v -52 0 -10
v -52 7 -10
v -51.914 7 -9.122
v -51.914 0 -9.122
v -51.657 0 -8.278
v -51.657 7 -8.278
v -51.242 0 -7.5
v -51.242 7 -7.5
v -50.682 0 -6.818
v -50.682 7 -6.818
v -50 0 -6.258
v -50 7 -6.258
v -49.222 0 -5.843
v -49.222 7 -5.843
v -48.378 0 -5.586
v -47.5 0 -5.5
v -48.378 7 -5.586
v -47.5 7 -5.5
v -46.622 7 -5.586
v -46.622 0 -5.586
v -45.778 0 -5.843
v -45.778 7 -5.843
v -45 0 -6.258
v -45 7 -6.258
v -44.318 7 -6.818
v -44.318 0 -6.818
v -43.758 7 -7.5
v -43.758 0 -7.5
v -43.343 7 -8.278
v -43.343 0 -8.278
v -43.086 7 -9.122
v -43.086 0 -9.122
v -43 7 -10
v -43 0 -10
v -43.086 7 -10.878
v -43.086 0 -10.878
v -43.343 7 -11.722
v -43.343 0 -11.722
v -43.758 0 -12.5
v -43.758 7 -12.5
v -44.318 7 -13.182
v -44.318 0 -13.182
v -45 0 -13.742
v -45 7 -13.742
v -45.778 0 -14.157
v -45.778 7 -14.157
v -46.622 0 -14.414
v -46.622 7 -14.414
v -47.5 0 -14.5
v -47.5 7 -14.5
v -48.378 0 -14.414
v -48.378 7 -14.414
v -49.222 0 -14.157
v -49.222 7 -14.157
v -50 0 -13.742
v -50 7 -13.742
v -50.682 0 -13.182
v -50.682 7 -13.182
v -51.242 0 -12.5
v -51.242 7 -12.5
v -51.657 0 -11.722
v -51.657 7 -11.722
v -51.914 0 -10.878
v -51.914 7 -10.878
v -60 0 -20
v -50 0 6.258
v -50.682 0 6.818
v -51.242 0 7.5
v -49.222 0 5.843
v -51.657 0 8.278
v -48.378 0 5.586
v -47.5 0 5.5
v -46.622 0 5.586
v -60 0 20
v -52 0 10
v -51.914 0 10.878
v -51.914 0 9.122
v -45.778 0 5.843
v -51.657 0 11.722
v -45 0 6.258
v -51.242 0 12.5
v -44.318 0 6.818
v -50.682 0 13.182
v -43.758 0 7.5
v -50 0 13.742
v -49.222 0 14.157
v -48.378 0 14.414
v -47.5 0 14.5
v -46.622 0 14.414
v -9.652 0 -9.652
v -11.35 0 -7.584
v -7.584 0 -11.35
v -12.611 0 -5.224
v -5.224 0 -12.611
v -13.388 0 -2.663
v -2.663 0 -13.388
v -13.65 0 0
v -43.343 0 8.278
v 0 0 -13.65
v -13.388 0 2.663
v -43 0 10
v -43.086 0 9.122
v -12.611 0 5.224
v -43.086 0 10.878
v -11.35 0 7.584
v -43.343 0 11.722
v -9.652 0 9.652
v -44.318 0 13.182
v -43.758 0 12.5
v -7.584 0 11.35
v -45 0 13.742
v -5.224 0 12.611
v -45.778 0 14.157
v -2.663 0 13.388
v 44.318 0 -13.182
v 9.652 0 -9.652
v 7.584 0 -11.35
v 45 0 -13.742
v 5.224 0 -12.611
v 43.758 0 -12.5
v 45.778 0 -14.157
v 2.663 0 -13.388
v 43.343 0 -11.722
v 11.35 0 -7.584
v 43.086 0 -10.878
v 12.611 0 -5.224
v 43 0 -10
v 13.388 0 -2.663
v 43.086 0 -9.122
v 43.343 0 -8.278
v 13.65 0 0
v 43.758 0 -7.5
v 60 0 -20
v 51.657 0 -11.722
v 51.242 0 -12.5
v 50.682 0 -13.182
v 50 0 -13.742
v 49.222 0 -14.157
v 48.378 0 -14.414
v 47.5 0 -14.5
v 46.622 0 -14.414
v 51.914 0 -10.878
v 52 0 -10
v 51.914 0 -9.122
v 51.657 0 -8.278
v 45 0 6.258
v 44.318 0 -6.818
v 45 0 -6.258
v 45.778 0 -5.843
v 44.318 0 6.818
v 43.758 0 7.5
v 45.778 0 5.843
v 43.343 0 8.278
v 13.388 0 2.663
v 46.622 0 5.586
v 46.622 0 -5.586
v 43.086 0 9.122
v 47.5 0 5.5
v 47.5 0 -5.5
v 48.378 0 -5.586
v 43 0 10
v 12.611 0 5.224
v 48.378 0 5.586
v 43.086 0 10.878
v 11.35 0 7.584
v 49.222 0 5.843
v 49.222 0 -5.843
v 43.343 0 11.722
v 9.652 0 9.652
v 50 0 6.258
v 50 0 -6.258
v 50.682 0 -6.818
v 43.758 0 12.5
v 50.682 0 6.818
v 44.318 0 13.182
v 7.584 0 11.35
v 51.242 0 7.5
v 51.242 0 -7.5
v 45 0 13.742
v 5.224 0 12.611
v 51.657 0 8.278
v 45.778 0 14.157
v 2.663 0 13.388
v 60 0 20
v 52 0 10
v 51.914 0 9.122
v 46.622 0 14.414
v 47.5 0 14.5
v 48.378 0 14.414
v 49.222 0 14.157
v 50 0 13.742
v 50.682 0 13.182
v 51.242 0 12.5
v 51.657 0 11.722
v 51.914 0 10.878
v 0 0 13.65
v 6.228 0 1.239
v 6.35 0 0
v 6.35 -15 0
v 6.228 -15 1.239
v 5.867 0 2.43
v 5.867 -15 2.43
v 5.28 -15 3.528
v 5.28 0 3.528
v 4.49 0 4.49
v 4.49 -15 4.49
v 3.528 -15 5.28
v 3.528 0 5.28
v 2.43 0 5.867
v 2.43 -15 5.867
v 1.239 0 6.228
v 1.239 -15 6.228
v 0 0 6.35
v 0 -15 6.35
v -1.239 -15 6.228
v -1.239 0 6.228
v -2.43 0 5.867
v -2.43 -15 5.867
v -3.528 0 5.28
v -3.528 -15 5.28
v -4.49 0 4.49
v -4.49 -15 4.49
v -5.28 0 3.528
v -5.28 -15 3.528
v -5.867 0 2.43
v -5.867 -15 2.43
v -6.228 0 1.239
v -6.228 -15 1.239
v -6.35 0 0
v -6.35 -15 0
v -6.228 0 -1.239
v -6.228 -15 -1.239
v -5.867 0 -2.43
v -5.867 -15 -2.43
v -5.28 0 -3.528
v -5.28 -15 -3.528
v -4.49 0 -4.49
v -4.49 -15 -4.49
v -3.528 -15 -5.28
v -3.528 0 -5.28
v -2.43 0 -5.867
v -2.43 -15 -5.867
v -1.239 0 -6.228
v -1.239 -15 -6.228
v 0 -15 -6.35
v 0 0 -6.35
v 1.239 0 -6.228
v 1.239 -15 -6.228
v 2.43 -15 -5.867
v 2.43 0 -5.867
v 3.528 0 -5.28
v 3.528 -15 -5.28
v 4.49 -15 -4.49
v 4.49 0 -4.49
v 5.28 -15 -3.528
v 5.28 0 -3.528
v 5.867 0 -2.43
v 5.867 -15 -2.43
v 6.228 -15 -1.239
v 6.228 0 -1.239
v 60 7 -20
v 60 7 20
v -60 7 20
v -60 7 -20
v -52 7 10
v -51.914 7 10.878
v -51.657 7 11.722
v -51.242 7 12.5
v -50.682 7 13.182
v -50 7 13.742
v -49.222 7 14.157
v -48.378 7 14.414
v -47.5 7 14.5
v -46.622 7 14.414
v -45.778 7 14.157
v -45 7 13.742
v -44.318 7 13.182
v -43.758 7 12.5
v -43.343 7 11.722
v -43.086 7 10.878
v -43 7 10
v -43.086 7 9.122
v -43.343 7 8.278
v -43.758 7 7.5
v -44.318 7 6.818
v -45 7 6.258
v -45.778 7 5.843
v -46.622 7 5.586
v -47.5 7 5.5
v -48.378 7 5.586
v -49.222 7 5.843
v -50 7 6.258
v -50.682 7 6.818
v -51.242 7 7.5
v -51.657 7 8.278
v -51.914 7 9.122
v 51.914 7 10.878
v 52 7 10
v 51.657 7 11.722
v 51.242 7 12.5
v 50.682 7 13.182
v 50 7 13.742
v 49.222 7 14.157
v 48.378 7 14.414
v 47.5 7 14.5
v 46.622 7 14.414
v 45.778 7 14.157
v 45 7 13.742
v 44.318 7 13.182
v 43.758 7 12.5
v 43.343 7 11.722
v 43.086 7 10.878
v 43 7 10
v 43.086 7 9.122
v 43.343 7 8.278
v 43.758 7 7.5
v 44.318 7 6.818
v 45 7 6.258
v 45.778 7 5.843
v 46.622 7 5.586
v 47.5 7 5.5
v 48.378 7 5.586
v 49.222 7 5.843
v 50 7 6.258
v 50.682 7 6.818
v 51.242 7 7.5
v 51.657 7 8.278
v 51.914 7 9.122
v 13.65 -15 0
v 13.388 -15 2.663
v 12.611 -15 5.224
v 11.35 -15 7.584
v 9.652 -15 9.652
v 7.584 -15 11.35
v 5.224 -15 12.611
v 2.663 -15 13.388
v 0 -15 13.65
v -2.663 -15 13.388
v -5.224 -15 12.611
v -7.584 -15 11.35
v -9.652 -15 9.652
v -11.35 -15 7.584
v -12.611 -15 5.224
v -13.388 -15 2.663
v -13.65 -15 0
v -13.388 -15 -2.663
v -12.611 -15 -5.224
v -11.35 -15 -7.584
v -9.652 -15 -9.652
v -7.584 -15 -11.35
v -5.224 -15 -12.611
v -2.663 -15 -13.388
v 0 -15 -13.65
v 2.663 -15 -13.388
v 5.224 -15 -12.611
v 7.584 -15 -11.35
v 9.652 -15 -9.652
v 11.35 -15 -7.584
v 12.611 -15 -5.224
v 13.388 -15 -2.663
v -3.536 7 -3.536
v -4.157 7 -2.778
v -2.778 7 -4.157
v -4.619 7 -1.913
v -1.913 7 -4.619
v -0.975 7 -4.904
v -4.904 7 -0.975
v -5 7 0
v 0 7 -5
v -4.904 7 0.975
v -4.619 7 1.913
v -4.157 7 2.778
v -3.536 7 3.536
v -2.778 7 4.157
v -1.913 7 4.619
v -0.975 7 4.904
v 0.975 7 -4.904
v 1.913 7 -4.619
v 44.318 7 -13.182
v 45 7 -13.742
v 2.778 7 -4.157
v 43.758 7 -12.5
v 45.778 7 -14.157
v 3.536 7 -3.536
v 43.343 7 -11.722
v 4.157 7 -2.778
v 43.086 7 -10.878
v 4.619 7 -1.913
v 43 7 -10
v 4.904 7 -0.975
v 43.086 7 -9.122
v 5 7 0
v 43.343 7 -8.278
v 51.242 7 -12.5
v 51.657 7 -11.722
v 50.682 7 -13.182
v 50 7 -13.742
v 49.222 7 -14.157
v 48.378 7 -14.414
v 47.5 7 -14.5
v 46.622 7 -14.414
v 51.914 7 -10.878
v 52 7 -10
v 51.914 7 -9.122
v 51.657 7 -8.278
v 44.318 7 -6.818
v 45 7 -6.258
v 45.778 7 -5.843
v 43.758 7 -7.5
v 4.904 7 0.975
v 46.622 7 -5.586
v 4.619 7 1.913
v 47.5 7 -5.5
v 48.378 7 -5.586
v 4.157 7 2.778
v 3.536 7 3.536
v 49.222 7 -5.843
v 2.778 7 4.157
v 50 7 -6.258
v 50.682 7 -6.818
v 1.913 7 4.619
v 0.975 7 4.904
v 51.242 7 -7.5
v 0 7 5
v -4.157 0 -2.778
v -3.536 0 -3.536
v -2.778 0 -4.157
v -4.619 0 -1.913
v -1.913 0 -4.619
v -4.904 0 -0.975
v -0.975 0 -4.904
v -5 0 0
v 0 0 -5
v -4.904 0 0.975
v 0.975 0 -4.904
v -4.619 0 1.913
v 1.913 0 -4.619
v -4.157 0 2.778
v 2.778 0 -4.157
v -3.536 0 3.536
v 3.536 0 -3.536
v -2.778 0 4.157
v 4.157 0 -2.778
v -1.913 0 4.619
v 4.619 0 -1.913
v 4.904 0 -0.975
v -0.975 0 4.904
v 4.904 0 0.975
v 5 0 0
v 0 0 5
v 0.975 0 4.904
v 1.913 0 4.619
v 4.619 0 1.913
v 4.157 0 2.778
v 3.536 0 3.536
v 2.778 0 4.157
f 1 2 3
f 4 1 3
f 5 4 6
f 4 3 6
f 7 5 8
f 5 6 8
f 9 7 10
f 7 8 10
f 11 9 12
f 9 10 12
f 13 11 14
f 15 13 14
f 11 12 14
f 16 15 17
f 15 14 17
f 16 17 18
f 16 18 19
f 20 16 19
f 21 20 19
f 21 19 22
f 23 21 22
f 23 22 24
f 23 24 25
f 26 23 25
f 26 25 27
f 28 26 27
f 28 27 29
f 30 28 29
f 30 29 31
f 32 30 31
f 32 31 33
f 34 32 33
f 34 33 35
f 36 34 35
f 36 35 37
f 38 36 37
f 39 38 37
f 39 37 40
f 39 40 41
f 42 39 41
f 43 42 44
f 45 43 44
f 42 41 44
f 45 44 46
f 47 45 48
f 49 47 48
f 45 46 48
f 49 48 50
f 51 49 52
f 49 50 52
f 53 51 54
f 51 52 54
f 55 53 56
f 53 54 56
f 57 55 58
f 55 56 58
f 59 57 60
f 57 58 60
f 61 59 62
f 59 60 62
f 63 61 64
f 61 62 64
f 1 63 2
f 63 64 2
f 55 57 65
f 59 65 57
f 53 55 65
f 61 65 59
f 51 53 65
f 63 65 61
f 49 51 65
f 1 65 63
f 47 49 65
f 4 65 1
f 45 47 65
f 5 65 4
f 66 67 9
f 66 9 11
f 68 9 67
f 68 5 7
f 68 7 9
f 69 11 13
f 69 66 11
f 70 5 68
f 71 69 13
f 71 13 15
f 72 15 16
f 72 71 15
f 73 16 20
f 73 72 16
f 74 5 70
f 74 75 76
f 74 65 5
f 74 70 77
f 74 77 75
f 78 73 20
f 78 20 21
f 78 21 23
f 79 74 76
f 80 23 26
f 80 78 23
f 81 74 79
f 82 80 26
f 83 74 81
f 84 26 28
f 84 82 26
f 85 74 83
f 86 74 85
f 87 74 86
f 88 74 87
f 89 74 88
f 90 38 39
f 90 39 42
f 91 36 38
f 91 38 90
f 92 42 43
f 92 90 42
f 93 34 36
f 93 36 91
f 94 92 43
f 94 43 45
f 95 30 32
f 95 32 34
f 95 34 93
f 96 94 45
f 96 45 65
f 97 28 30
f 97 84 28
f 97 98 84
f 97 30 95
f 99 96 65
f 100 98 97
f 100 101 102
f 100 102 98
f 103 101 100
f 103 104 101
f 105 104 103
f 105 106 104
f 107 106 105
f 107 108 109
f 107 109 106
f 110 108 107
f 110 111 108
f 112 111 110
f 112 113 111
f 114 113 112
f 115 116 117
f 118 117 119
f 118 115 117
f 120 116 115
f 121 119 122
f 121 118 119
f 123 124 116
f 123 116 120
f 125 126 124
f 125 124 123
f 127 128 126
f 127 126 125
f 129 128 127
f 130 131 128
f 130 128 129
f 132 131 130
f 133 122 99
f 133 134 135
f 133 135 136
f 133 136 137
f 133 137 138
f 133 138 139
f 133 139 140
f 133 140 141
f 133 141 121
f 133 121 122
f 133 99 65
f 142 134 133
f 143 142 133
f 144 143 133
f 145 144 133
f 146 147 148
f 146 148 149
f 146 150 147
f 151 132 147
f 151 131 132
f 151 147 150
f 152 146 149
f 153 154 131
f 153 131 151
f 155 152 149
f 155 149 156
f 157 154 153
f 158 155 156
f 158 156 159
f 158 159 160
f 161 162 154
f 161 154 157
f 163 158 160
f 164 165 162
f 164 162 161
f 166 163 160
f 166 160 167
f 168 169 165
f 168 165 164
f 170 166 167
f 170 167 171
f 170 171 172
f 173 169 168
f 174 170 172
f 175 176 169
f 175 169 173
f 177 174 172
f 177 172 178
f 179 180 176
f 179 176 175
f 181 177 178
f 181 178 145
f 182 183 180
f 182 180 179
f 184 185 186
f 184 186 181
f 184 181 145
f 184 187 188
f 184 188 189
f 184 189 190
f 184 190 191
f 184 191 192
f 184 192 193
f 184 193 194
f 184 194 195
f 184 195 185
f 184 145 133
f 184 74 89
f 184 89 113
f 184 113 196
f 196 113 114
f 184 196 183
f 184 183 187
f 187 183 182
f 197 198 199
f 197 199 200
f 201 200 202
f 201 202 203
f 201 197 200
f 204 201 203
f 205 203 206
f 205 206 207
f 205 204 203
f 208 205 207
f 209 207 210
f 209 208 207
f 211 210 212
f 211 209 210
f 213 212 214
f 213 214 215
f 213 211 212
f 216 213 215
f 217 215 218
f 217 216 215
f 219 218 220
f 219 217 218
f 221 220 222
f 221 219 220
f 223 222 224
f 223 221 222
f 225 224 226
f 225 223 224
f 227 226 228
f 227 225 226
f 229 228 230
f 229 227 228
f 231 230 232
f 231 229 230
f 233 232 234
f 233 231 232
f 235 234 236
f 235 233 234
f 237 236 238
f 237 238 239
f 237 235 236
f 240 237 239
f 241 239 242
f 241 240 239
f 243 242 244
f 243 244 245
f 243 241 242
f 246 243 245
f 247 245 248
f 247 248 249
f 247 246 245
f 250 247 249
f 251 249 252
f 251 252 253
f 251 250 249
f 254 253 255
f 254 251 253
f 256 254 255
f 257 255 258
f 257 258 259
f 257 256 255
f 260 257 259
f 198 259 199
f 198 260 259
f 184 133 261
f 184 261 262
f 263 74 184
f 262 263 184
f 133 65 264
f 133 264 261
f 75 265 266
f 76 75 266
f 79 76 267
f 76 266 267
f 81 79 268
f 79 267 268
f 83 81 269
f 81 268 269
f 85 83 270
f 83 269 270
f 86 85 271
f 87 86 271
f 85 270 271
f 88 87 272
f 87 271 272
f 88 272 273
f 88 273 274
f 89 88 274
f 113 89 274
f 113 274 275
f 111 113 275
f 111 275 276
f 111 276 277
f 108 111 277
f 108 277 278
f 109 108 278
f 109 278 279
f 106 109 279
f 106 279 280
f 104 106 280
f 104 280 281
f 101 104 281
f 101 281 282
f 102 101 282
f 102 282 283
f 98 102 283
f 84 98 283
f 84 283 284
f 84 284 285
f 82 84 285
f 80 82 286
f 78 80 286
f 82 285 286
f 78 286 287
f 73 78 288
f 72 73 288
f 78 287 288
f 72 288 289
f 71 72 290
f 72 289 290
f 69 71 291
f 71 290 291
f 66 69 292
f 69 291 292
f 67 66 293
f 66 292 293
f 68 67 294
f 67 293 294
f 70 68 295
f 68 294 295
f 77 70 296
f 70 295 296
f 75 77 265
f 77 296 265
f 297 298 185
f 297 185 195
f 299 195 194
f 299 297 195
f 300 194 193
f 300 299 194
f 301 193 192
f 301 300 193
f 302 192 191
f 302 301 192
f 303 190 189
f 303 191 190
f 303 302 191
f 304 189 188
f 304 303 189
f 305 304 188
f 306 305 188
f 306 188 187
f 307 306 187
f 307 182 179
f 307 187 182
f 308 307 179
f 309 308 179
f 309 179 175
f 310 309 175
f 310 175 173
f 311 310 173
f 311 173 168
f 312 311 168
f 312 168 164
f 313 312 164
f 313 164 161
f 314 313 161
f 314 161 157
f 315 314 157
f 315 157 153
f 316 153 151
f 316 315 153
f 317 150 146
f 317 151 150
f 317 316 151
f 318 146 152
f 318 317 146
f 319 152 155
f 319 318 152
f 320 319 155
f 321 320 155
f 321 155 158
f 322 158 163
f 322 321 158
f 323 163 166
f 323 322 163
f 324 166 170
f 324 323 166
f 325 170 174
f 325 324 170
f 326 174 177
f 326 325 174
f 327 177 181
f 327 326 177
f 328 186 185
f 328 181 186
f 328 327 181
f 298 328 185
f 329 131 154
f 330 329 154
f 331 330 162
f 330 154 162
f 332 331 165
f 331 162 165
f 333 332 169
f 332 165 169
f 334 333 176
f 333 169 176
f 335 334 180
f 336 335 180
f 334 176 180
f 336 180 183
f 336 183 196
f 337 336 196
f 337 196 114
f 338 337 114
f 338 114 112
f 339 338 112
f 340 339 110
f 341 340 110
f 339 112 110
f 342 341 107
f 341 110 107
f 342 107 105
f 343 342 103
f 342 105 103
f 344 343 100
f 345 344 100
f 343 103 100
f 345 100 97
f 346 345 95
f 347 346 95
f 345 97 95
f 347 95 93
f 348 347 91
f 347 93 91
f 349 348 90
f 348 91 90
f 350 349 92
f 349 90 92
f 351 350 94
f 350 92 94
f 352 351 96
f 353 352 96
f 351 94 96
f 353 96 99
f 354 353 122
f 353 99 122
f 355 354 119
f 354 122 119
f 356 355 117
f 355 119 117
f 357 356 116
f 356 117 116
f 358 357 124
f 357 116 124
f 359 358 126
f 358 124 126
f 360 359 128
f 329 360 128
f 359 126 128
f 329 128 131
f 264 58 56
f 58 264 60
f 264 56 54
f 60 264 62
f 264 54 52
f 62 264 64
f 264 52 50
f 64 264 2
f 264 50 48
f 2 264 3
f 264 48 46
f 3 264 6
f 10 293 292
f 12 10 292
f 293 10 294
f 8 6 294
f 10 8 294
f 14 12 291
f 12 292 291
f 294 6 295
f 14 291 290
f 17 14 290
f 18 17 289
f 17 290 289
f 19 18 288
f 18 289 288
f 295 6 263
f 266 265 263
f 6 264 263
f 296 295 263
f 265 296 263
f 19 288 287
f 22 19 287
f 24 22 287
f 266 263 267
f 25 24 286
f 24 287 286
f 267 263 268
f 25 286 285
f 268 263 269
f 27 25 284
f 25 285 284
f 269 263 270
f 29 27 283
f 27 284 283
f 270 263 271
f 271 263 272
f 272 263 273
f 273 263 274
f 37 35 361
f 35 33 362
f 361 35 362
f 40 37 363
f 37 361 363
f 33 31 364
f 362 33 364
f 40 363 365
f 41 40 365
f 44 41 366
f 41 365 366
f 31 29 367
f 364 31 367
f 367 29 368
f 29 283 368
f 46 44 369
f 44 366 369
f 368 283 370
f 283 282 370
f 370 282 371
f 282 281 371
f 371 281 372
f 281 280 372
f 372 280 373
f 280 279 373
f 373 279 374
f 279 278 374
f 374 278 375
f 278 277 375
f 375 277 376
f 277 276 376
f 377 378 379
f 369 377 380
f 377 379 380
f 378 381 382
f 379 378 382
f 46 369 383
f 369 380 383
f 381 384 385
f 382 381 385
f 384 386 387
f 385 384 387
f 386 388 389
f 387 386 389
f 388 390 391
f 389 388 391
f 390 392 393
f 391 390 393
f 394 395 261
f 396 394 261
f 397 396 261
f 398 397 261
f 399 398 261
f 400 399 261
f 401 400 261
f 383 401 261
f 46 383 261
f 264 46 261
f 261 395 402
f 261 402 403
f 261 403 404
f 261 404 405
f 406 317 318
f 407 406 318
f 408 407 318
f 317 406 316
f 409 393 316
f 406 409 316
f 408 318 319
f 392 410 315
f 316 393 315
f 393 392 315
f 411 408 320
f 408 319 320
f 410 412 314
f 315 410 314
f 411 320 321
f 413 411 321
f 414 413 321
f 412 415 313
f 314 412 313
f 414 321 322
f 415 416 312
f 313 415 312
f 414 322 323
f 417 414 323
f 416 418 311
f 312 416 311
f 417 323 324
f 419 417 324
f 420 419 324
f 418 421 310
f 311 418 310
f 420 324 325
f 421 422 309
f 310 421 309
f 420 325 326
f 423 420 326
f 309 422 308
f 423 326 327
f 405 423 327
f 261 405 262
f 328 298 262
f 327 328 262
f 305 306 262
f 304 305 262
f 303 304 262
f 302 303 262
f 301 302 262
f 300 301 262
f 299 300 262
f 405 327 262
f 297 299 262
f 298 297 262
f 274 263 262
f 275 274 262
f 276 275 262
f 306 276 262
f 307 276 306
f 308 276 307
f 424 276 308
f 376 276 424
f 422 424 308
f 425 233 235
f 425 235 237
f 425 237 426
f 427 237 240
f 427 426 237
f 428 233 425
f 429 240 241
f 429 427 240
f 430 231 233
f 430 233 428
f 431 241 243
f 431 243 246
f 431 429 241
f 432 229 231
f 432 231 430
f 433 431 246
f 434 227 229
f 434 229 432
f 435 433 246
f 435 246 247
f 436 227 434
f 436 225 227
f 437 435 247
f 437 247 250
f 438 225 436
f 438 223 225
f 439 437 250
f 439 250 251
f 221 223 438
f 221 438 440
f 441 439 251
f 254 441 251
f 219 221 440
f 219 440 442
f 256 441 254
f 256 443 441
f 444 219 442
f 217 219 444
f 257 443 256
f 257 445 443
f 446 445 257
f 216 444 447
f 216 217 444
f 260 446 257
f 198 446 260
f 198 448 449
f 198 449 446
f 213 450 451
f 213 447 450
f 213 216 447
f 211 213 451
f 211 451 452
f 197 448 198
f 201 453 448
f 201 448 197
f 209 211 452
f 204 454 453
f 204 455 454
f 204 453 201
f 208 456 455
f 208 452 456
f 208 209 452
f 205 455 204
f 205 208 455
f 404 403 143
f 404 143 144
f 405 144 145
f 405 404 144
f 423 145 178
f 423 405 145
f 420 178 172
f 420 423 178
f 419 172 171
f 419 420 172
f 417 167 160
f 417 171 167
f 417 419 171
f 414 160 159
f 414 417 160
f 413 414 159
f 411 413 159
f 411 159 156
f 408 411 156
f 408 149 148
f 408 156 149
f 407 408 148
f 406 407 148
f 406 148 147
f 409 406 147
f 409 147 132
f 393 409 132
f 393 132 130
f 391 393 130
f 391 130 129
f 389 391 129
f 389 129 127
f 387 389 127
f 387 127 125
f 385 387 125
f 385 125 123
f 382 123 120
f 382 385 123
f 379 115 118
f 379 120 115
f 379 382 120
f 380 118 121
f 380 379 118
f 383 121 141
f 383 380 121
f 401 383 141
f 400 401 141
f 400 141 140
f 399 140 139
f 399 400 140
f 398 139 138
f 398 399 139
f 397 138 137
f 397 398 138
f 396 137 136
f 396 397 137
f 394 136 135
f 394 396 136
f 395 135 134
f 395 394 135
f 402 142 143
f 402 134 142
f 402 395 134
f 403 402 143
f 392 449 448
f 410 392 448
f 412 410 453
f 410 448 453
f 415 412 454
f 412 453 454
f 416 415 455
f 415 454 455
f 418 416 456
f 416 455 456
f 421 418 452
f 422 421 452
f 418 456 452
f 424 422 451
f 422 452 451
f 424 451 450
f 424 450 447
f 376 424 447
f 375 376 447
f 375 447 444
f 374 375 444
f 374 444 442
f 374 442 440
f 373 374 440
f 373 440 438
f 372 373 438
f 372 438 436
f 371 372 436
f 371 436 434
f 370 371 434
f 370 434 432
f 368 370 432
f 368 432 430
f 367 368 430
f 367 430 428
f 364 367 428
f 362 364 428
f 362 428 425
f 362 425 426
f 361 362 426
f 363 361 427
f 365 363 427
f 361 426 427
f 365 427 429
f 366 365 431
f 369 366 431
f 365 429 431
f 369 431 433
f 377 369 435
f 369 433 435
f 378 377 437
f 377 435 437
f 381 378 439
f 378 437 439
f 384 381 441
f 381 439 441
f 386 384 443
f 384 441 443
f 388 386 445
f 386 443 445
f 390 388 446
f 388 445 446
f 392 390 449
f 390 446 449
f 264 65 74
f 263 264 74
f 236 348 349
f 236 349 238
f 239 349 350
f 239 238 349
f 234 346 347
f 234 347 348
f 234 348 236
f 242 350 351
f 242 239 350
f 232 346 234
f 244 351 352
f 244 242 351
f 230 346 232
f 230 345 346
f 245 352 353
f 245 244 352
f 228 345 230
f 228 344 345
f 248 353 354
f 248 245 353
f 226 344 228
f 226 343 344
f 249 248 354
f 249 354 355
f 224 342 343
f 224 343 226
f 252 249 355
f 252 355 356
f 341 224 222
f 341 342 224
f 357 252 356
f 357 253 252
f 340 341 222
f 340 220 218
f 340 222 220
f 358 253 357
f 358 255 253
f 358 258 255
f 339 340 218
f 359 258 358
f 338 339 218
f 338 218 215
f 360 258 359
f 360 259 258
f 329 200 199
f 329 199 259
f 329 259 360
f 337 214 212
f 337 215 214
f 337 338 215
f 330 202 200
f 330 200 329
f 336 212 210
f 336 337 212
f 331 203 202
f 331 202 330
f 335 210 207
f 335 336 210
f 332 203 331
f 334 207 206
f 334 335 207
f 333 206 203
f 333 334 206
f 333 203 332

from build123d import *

# Parameters (mm, degrees)
F0_R     = 13.65
F0_R_2   = 6.35
F1_DEPTH = 15
F2_W     = 120
F2_H     = 40
F3_DEPTH = 7
F5_D     = 9
F7_D     = 10
F7_DEPTH = 100
F7_TIP   = 3.0043030951


# Not quite as in the source:
# - a pattern or mirror of a feature is missing from the dataset's text; its kind, count and spacing are read off the source's solid


with BuildPart() as f1:
    # F0 (on Front) → F1 (new body)
    with BuildSketch(Plane.XZ):
        Circle(F0_R)
        Circle(F0_R_2, mode=Mode.SUBTRACT)
    extrude(amount=F1_DEPTH)

    # F2 (on Front) → F3 (join)
    with BuildSketch(Plane.XZ):
        Rectangle(F2_W, F2_H)
    extrude(amount=-F3_DEPTH)

    # F5 (through all)
    with Locations(Plane.XZ):
        with Locations((-47.5, 10), (-47.5, -10)):
            f5 = Hole(F5_D / 2)

    # F5_copies: F5 across plane
    add(f5.mirror(Plane(origin=(0, 0, 0), x_dir=(0, 0, 1), z_dir=(1, 0, 0))), mode=Mode.SUBTRACT)

    # F7
    with Locations(Plane(origin=(0, 7, 0), x_dir=(-1, 0, 0), z_dir=(0, 1, 0))):
        with Locations((0, 0)):
            Hole(F7_D / 2, depth=F7_DEPTH)
            with Locations((0, 0, -(F7_DEPTH + F7_TIP / 2))):  # 118° drill point
                Cone(0, F7_D / 2, F7_TIP, mode=Mode.SUBTRACT)


solid = f1.part
